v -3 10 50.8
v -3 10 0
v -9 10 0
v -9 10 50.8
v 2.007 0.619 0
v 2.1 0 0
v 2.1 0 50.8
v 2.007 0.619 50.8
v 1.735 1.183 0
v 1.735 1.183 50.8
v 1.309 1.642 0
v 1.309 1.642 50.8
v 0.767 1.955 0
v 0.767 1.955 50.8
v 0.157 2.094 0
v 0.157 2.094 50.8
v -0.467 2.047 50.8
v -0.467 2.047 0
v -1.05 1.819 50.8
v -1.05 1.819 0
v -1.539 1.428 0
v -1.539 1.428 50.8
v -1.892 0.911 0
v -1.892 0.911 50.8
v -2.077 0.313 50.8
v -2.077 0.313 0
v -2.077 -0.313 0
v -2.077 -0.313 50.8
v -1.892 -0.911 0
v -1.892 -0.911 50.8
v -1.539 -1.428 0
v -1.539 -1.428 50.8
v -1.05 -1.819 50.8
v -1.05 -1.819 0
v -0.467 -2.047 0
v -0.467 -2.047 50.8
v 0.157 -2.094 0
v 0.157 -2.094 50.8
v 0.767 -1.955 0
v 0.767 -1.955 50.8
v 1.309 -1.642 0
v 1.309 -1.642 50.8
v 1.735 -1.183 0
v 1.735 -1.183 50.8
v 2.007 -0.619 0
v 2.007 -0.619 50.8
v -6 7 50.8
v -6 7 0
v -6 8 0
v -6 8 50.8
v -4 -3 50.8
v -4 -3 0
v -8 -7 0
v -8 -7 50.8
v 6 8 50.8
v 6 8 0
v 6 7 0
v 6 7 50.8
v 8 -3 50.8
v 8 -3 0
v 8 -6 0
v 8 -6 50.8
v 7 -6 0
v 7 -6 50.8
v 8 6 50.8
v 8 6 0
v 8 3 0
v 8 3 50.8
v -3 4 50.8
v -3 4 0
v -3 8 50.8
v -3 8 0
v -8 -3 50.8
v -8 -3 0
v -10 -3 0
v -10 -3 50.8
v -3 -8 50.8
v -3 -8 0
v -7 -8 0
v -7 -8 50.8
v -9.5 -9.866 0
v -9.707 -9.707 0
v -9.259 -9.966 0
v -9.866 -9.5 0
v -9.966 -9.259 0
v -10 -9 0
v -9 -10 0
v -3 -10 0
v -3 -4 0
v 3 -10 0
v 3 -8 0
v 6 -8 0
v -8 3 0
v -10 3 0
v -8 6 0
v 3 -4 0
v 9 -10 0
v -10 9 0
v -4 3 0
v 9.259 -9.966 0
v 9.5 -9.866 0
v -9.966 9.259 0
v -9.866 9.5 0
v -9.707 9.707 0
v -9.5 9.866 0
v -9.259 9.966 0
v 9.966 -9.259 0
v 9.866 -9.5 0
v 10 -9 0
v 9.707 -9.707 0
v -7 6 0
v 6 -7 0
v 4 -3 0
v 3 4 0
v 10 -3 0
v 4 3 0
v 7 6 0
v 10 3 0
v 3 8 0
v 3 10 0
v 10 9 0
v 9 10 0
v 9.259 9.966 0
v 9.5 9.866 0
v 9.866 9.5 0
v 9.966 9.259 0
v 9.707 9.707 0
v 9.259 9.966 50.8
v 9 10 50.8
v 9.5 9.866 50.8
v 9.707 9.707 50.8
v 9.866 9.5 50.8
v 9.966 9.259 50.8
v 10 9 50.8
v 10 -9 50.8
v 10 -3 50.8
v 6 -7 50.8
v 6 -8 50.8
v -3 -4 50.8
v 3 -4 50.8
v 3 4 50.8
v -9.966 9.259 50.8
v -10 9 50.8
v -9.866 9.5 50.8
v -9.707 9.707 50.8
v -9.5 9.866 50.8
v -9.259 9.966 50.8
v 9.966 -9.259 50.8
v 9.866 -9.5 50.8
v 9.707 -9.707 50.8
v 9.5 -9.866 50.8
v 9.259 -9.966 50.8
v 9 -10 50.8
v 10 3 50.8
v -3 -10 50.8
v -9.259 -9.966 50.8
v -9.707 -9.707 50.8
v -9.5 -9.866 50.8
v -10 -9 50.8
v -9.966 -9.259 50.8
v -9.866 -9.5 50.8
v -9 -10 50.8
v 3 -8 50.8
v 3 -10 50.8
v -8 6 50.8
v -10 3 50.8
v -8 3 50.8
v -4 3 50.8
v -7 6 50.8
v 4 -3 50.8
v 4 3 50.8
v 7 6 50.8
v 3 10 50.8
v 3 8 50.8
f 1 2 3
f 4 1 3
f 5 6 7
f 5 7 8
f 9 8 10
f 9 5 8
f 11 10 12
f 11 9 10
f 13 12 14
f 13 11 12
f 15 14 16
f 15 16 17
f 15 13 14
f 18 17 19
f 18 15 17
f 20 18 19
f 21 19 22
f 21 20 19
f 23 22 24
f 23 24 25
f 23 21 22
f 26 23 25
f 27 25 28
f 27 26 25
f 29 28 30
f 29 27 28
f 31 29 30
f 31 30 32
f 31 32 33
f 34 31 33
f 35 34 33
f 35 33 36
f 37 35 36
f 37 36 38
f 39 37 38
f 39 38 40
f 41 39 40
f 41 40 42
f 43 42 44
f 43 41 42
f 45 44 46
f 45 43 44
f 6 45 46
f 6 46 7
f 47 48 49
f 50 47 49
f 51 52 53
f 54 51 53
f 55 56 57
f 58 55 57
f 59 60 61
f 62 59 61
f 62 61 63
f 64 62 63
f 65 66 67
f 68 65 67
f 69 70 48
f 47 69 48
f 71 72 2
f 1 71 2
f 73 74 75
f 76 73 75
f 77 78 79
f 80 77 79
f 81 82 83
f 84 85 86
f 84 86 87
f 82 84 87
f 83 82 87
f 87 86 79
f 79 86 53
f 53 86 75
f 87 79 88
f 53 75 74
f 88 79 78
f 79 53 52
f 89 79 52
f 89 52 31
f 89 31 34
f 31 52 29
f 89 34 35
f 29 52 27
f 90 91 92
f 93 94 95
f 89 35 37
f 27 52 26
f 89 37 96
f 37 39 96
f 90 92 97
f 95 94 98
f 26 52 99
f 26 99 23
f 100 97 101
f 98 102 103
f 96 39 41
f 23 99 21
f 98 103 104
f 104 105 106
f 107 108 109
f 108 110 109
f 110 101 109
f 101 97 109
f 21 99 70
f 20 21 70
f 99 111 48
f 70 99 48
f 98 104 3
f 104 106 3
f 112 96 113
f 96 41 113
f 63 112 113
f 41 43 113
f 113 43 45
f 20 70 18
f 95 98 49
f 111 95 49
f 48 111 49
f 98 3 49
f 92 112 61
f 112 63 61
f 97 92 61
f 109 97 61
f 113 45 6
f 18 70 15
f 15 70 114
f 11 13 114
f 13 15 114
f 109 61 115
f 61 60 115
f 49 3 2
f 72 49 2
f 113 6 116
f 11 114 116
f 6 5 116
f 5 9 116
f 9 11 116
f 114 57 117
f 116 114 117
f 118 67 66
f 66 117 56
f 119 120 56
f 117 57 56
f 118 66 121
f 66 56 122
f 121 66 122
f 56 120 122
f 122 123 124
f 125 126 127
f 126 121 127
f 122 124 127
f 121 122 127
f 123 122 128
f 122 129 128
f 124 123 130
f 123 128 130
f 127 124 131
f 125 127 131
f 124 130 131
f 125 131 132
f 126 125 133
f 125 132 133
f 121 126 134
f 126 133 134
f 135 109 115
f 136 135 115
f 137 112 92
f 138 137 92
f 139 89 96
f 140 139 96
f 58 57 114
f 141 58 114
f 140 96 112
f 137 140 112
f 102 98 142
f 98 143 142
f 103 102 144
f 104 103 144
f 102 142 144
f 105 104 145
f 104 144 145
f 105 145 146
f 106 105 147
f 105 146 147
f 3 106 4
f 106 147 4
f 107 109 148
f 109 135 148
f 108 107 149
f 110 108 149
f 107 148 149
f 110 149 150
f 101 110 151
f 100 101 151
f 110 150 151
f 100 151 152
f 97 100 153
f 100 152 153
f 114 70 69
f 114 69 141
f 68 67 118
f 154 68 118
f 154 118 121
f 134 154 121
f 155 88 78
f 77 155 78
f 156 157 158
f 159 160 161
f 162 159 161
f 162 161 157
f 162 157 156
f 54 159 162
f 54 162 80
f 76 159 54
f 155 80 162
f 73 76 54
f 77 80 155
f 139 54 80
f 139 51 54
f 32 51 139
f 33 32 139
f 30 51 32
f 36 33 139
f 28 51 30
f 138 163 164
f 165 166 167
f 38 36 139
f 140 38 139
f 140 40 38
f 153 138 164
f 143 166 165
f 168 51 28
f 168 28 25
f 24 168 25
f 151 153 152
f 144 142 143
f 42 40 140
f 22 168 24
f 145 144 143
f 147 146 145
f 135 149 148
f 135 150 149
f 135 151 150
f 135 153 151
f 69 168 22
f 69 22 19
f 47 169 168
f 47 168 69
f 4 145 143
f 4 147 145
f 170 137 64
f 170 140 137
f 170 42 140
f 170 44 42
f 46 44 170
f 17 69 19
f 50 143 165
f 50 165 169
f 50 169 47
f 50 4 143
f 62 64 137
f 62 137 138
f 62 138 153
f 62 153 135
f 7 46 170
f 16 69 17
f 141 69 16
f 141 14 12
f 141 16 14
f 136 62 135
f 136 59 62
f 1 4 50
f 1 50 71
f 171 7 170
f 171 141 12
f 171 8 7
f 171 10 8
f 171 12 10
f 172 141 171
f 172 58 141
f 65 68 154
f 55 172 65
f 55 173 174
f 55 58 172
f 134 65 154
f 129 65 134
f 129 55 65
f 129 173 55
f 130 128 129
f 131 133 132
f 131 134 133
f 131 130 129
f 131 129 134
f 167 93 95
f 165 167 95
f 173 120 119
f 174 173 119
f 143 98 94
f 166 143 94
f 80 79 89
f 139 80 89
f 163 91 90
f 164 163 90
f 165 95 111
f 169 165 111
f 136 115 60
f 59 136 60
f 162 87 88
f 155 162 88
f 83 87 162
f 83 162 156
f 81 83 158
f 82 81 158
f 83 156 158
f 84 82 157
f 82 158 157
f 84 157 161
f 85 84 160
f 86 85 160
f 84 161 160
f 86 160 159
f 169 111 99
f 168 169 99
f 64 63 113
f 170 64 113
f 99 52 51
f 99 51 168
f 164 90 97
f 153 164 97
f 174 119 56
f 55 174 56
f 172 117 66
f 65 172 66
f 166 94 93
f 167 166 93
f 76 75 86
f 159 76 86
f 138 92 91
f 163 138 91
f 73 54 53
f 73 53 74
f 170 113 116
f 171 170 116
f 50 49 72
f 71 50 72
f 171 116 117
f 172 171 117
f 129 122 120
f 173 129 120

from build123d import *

# Parameters (mm, degrees)
SKETCH1_W           = 1
SKETCH1_H           = 1
SKETCH1_W_2         = 6
SKETCH1_H_2         = 6
SKETCH1_R           = 2.1
BOSS_EXTRUDE1_DEPTH = 50.8
FILLET1_R           = 1


with BuildPart() as part:
    # Sketch1 → Boss-Extrude1 (new body)
    # profile 1 of 35: a face of its own
    with BuildSketch(Plane.XY):
        Polygon((-6, 7), (-6, 8), (-7, 8), align=None)
    # profile 2 of 35: a face of its own
    with BuildSketch(Plane.XY):
        Polygon((-6, 7), (-7, 8), (-8, 8), (-8, 7), (-7, 6), (-6, 6), align=None)
    # profile 3 of 35: a face of its own
    with BuildSketch(Plane.XY):
        Polygon((-8, 7), (-8, 6), (-7, 6), align=None)
    # profile 4 of 35: a face of its own
    with BuildSketch(Plane.XY):
        Polygon((-3, 8), (-3, 10), (-10, 10), (-10, 3), (-8, 3), (-8, 6), (-8, 7), (-8, 8), (-7, 8), (-6, 8), align=None)
    # profile 5 of 35: a face of its own
    with BuildSketch(Plane.XY):
        Polygon((-6, 5), (-6, 6), (-7, 6), align=None)
    # profile 6 of 35: a face of its own
    with BuildSketch(Plane.XY):
        Polygon((-6, 6), (-5, 6), (-6, 7), align=None)
    # profile 7 of 35: a face of its own
    with BuildSketch(Plane.XY):
        Polygon((-3, 4), (-5, 6), (-6, 6), (-6, 5), (-4, 3), (-4, 4), align=None)
    # profile 8 of 35: a face of its own
    with BuildSketch(Plane.XY):
        with Locations((-3.5, 3.5)):
            Rectangle(SKETCH1_W, SKETCH1_H)
    # profile 9 of 35: a face of its own
    with BuildSketch(Plane.XY):
        with Locations((0, 3.5)):
            Rectangle(SKETCH1_W_2, SKETCH1_H)
    # profile 10 of 35: a face of its own
    with BuildSketch(Plane.XY):
        with Locations((-3.5, 0)):
            Rectangle(SKETCH1_W, SKETCH1_H_2)
    # profile 11 of 35: a face of its own
    with BuildSketch(Plane.XY):
        Rectangle(SKETCH1_W_2, SKETCH1_H_2)
        Circle(SKETCH1_R, mode=Mode.SUBTRACT)
    # profile 12 of 35: a face of its own
    with BuildSketch(Plane.XY):
        with Locations((3.5, 3.5)):
            Rectangle(SKETCH1_W, SKETCH1_H)
    # profile 13 of 35: a face of its own
    with BuildSketch(Plane.XY):
        Polygon((6, 6), (5, 6), (3, 4), (4, 4), (4, 3), (6, 5), align=None)
    # profile 14 of 35: a face of its own
    with BuildSketch(Plane.XY):
        Polygon((6, 7), (5, 6), (6, 6), align=None)
    # profile 15 of 35: a face of its own
    with BuildSketch(Plane.XY):
        Polygon((6, 6), (6, 5), (7, 6), align=None)
    # profile 16 of 35: a face of its own
    with BuildSketch(Plane.XY):
        Polygon((8, 8), (7, 8), (6, 7), (6, 6), (7, 6), (8, 7), align=None)
    # profile 17 of 35: a face of its own
    with BuildSketch(Plane.XY):
        Polygon((7, 8), (6, 8), (6, 7), align=None)
    # profile 18 of 35: a face of its own
    with BuildSketch(Plane.XY):
        Polygon((7, 6), (8, 6), (8, 7), align=None)
    # profile 19 of 35: a face of its own
    with BuildSketch(Plane.XY):
        Polygon((10, 3), (10, 10), (3, 10), (3, 8), (6, 8), (7, 8), (8, 8), (8, 7), (8, 6), (8, 3), align=None)
    # profile 20 of 35: a face of its own
    with BuildSketch(Plane.XY):
        with Locations((3.5, 0)):
            Rectangle(SKETCH1_W, SKETCH1_H_2)
    # profile 21 of 35: a face of its own
    with BuildSketch(Plane.XY):
        with Locations((3.5, -3.5)):
            Rectangle(SKETCH1_W, SKETCH1_H)
    # profile 22 of 35: a face of its own
    with BuildSketch(Plane.XY):
        Polygon((6, -6), (6, -5), (4, -3), (4, -4), (3, -4), (5, -6), align=None)
    # profile 23 of 35: a face of its own
    with BuildSketch(Plane.XY):
        Polygon((7, -6), (6, -5), (6, -6), align=None)
    # profile 24 of 35: a face of its own
    with BuildSketch(Plane.XY):
        Polygon((6, -7), (6, -6), (5, -6), align=None)
    # profile 25 of 35: a face of its own
    with BuildSketch(Plane.XY):
        Polygon((8, -8), (8, -7), (7, -6), (6, -6), (6, -7), (7, -8), align=None)
    # profile 26 of 35: a face of its own
    with BuildSketch(Plane.XY):
        Polygon((6, -7), (6, -8), (7, -8), align=None)
    # profile 27 of 35: a face of its own
    with BuildSketch(Plane.XY):
        Polygon((8, -7), (8, -6), (7, -6), align=None)
    # profile 28 of 35: a face of its own
    with BuildSketch(Plane.XY):
        Polygon((10, -10), (10, -3), (8, -3), (8, -6), (8, -7), (8, -8), (7, -8), (6, -8), (3, -8), (3, -10), align=None)
    # profile 29 of 35: a face of its own
    with BuildSketch(Plane.XY):
        with Locations((0, -3.5)):
            Rectangle(SKETCH1_W_2, SKETCH1_H)
    # profile 30 of 35: a face of its own
    with BuildSketch(Plane.XY):
        with Locations((-3.5, -3.5)):
            Rectangle(SKETCH1_W, SKETCH1_H)
    # profile 31 of 35: a face of its own
    with BuildSketch(Plane.XY):
        Polygon((-4, -3), (-6, -5), (-6, -6), (-5, -6), (-3, -4), (-4, -4), align=None)
    # profile 32 of 35: a face of its own
    with BuildSketch(Plane.XY):
        Polygon((-6, -7), (-5, -6), (-6, -6), align=None)
    # profile 33 of 35: a face of its own
    with BuildSketch(Plane.XY):
        Polygon((-6, -6), (-6, -5), (-7, -6), align=None)
    # profile 34 of 35: a face of its own
    with BuildSketch(Plane.XY):
        Polygon((-7, -6), (-8, -7), (-8, -8), (-7, -8), (-6, -7), (-6, -6), align=None)
    # profile 35 of 35: a face of its own
    with BuildSketch(Plane.XY):
        Polygon((-8, -3), (-10, -3), (-10, -10), (-3, -10), (-3, -8), (-6, -8), (-7, -8), (-8, -8), (-8, -7), (-8, -6), align=None)
    extrude(amount=BOSS_EXTRUDE1_DEPTH)

    # Fillet1
    fillet1_edges = [part.edges().sort_by_distance(p)[0] for p in [
        (-10, -10, 25.4),
        (-10, 10, 25.4),
        (10, 10, 25.4),
        (10, -10, 25.4),
    ]]
    fillet(fillet1_edges, radius=FILLET1_R)


solid = part.part
